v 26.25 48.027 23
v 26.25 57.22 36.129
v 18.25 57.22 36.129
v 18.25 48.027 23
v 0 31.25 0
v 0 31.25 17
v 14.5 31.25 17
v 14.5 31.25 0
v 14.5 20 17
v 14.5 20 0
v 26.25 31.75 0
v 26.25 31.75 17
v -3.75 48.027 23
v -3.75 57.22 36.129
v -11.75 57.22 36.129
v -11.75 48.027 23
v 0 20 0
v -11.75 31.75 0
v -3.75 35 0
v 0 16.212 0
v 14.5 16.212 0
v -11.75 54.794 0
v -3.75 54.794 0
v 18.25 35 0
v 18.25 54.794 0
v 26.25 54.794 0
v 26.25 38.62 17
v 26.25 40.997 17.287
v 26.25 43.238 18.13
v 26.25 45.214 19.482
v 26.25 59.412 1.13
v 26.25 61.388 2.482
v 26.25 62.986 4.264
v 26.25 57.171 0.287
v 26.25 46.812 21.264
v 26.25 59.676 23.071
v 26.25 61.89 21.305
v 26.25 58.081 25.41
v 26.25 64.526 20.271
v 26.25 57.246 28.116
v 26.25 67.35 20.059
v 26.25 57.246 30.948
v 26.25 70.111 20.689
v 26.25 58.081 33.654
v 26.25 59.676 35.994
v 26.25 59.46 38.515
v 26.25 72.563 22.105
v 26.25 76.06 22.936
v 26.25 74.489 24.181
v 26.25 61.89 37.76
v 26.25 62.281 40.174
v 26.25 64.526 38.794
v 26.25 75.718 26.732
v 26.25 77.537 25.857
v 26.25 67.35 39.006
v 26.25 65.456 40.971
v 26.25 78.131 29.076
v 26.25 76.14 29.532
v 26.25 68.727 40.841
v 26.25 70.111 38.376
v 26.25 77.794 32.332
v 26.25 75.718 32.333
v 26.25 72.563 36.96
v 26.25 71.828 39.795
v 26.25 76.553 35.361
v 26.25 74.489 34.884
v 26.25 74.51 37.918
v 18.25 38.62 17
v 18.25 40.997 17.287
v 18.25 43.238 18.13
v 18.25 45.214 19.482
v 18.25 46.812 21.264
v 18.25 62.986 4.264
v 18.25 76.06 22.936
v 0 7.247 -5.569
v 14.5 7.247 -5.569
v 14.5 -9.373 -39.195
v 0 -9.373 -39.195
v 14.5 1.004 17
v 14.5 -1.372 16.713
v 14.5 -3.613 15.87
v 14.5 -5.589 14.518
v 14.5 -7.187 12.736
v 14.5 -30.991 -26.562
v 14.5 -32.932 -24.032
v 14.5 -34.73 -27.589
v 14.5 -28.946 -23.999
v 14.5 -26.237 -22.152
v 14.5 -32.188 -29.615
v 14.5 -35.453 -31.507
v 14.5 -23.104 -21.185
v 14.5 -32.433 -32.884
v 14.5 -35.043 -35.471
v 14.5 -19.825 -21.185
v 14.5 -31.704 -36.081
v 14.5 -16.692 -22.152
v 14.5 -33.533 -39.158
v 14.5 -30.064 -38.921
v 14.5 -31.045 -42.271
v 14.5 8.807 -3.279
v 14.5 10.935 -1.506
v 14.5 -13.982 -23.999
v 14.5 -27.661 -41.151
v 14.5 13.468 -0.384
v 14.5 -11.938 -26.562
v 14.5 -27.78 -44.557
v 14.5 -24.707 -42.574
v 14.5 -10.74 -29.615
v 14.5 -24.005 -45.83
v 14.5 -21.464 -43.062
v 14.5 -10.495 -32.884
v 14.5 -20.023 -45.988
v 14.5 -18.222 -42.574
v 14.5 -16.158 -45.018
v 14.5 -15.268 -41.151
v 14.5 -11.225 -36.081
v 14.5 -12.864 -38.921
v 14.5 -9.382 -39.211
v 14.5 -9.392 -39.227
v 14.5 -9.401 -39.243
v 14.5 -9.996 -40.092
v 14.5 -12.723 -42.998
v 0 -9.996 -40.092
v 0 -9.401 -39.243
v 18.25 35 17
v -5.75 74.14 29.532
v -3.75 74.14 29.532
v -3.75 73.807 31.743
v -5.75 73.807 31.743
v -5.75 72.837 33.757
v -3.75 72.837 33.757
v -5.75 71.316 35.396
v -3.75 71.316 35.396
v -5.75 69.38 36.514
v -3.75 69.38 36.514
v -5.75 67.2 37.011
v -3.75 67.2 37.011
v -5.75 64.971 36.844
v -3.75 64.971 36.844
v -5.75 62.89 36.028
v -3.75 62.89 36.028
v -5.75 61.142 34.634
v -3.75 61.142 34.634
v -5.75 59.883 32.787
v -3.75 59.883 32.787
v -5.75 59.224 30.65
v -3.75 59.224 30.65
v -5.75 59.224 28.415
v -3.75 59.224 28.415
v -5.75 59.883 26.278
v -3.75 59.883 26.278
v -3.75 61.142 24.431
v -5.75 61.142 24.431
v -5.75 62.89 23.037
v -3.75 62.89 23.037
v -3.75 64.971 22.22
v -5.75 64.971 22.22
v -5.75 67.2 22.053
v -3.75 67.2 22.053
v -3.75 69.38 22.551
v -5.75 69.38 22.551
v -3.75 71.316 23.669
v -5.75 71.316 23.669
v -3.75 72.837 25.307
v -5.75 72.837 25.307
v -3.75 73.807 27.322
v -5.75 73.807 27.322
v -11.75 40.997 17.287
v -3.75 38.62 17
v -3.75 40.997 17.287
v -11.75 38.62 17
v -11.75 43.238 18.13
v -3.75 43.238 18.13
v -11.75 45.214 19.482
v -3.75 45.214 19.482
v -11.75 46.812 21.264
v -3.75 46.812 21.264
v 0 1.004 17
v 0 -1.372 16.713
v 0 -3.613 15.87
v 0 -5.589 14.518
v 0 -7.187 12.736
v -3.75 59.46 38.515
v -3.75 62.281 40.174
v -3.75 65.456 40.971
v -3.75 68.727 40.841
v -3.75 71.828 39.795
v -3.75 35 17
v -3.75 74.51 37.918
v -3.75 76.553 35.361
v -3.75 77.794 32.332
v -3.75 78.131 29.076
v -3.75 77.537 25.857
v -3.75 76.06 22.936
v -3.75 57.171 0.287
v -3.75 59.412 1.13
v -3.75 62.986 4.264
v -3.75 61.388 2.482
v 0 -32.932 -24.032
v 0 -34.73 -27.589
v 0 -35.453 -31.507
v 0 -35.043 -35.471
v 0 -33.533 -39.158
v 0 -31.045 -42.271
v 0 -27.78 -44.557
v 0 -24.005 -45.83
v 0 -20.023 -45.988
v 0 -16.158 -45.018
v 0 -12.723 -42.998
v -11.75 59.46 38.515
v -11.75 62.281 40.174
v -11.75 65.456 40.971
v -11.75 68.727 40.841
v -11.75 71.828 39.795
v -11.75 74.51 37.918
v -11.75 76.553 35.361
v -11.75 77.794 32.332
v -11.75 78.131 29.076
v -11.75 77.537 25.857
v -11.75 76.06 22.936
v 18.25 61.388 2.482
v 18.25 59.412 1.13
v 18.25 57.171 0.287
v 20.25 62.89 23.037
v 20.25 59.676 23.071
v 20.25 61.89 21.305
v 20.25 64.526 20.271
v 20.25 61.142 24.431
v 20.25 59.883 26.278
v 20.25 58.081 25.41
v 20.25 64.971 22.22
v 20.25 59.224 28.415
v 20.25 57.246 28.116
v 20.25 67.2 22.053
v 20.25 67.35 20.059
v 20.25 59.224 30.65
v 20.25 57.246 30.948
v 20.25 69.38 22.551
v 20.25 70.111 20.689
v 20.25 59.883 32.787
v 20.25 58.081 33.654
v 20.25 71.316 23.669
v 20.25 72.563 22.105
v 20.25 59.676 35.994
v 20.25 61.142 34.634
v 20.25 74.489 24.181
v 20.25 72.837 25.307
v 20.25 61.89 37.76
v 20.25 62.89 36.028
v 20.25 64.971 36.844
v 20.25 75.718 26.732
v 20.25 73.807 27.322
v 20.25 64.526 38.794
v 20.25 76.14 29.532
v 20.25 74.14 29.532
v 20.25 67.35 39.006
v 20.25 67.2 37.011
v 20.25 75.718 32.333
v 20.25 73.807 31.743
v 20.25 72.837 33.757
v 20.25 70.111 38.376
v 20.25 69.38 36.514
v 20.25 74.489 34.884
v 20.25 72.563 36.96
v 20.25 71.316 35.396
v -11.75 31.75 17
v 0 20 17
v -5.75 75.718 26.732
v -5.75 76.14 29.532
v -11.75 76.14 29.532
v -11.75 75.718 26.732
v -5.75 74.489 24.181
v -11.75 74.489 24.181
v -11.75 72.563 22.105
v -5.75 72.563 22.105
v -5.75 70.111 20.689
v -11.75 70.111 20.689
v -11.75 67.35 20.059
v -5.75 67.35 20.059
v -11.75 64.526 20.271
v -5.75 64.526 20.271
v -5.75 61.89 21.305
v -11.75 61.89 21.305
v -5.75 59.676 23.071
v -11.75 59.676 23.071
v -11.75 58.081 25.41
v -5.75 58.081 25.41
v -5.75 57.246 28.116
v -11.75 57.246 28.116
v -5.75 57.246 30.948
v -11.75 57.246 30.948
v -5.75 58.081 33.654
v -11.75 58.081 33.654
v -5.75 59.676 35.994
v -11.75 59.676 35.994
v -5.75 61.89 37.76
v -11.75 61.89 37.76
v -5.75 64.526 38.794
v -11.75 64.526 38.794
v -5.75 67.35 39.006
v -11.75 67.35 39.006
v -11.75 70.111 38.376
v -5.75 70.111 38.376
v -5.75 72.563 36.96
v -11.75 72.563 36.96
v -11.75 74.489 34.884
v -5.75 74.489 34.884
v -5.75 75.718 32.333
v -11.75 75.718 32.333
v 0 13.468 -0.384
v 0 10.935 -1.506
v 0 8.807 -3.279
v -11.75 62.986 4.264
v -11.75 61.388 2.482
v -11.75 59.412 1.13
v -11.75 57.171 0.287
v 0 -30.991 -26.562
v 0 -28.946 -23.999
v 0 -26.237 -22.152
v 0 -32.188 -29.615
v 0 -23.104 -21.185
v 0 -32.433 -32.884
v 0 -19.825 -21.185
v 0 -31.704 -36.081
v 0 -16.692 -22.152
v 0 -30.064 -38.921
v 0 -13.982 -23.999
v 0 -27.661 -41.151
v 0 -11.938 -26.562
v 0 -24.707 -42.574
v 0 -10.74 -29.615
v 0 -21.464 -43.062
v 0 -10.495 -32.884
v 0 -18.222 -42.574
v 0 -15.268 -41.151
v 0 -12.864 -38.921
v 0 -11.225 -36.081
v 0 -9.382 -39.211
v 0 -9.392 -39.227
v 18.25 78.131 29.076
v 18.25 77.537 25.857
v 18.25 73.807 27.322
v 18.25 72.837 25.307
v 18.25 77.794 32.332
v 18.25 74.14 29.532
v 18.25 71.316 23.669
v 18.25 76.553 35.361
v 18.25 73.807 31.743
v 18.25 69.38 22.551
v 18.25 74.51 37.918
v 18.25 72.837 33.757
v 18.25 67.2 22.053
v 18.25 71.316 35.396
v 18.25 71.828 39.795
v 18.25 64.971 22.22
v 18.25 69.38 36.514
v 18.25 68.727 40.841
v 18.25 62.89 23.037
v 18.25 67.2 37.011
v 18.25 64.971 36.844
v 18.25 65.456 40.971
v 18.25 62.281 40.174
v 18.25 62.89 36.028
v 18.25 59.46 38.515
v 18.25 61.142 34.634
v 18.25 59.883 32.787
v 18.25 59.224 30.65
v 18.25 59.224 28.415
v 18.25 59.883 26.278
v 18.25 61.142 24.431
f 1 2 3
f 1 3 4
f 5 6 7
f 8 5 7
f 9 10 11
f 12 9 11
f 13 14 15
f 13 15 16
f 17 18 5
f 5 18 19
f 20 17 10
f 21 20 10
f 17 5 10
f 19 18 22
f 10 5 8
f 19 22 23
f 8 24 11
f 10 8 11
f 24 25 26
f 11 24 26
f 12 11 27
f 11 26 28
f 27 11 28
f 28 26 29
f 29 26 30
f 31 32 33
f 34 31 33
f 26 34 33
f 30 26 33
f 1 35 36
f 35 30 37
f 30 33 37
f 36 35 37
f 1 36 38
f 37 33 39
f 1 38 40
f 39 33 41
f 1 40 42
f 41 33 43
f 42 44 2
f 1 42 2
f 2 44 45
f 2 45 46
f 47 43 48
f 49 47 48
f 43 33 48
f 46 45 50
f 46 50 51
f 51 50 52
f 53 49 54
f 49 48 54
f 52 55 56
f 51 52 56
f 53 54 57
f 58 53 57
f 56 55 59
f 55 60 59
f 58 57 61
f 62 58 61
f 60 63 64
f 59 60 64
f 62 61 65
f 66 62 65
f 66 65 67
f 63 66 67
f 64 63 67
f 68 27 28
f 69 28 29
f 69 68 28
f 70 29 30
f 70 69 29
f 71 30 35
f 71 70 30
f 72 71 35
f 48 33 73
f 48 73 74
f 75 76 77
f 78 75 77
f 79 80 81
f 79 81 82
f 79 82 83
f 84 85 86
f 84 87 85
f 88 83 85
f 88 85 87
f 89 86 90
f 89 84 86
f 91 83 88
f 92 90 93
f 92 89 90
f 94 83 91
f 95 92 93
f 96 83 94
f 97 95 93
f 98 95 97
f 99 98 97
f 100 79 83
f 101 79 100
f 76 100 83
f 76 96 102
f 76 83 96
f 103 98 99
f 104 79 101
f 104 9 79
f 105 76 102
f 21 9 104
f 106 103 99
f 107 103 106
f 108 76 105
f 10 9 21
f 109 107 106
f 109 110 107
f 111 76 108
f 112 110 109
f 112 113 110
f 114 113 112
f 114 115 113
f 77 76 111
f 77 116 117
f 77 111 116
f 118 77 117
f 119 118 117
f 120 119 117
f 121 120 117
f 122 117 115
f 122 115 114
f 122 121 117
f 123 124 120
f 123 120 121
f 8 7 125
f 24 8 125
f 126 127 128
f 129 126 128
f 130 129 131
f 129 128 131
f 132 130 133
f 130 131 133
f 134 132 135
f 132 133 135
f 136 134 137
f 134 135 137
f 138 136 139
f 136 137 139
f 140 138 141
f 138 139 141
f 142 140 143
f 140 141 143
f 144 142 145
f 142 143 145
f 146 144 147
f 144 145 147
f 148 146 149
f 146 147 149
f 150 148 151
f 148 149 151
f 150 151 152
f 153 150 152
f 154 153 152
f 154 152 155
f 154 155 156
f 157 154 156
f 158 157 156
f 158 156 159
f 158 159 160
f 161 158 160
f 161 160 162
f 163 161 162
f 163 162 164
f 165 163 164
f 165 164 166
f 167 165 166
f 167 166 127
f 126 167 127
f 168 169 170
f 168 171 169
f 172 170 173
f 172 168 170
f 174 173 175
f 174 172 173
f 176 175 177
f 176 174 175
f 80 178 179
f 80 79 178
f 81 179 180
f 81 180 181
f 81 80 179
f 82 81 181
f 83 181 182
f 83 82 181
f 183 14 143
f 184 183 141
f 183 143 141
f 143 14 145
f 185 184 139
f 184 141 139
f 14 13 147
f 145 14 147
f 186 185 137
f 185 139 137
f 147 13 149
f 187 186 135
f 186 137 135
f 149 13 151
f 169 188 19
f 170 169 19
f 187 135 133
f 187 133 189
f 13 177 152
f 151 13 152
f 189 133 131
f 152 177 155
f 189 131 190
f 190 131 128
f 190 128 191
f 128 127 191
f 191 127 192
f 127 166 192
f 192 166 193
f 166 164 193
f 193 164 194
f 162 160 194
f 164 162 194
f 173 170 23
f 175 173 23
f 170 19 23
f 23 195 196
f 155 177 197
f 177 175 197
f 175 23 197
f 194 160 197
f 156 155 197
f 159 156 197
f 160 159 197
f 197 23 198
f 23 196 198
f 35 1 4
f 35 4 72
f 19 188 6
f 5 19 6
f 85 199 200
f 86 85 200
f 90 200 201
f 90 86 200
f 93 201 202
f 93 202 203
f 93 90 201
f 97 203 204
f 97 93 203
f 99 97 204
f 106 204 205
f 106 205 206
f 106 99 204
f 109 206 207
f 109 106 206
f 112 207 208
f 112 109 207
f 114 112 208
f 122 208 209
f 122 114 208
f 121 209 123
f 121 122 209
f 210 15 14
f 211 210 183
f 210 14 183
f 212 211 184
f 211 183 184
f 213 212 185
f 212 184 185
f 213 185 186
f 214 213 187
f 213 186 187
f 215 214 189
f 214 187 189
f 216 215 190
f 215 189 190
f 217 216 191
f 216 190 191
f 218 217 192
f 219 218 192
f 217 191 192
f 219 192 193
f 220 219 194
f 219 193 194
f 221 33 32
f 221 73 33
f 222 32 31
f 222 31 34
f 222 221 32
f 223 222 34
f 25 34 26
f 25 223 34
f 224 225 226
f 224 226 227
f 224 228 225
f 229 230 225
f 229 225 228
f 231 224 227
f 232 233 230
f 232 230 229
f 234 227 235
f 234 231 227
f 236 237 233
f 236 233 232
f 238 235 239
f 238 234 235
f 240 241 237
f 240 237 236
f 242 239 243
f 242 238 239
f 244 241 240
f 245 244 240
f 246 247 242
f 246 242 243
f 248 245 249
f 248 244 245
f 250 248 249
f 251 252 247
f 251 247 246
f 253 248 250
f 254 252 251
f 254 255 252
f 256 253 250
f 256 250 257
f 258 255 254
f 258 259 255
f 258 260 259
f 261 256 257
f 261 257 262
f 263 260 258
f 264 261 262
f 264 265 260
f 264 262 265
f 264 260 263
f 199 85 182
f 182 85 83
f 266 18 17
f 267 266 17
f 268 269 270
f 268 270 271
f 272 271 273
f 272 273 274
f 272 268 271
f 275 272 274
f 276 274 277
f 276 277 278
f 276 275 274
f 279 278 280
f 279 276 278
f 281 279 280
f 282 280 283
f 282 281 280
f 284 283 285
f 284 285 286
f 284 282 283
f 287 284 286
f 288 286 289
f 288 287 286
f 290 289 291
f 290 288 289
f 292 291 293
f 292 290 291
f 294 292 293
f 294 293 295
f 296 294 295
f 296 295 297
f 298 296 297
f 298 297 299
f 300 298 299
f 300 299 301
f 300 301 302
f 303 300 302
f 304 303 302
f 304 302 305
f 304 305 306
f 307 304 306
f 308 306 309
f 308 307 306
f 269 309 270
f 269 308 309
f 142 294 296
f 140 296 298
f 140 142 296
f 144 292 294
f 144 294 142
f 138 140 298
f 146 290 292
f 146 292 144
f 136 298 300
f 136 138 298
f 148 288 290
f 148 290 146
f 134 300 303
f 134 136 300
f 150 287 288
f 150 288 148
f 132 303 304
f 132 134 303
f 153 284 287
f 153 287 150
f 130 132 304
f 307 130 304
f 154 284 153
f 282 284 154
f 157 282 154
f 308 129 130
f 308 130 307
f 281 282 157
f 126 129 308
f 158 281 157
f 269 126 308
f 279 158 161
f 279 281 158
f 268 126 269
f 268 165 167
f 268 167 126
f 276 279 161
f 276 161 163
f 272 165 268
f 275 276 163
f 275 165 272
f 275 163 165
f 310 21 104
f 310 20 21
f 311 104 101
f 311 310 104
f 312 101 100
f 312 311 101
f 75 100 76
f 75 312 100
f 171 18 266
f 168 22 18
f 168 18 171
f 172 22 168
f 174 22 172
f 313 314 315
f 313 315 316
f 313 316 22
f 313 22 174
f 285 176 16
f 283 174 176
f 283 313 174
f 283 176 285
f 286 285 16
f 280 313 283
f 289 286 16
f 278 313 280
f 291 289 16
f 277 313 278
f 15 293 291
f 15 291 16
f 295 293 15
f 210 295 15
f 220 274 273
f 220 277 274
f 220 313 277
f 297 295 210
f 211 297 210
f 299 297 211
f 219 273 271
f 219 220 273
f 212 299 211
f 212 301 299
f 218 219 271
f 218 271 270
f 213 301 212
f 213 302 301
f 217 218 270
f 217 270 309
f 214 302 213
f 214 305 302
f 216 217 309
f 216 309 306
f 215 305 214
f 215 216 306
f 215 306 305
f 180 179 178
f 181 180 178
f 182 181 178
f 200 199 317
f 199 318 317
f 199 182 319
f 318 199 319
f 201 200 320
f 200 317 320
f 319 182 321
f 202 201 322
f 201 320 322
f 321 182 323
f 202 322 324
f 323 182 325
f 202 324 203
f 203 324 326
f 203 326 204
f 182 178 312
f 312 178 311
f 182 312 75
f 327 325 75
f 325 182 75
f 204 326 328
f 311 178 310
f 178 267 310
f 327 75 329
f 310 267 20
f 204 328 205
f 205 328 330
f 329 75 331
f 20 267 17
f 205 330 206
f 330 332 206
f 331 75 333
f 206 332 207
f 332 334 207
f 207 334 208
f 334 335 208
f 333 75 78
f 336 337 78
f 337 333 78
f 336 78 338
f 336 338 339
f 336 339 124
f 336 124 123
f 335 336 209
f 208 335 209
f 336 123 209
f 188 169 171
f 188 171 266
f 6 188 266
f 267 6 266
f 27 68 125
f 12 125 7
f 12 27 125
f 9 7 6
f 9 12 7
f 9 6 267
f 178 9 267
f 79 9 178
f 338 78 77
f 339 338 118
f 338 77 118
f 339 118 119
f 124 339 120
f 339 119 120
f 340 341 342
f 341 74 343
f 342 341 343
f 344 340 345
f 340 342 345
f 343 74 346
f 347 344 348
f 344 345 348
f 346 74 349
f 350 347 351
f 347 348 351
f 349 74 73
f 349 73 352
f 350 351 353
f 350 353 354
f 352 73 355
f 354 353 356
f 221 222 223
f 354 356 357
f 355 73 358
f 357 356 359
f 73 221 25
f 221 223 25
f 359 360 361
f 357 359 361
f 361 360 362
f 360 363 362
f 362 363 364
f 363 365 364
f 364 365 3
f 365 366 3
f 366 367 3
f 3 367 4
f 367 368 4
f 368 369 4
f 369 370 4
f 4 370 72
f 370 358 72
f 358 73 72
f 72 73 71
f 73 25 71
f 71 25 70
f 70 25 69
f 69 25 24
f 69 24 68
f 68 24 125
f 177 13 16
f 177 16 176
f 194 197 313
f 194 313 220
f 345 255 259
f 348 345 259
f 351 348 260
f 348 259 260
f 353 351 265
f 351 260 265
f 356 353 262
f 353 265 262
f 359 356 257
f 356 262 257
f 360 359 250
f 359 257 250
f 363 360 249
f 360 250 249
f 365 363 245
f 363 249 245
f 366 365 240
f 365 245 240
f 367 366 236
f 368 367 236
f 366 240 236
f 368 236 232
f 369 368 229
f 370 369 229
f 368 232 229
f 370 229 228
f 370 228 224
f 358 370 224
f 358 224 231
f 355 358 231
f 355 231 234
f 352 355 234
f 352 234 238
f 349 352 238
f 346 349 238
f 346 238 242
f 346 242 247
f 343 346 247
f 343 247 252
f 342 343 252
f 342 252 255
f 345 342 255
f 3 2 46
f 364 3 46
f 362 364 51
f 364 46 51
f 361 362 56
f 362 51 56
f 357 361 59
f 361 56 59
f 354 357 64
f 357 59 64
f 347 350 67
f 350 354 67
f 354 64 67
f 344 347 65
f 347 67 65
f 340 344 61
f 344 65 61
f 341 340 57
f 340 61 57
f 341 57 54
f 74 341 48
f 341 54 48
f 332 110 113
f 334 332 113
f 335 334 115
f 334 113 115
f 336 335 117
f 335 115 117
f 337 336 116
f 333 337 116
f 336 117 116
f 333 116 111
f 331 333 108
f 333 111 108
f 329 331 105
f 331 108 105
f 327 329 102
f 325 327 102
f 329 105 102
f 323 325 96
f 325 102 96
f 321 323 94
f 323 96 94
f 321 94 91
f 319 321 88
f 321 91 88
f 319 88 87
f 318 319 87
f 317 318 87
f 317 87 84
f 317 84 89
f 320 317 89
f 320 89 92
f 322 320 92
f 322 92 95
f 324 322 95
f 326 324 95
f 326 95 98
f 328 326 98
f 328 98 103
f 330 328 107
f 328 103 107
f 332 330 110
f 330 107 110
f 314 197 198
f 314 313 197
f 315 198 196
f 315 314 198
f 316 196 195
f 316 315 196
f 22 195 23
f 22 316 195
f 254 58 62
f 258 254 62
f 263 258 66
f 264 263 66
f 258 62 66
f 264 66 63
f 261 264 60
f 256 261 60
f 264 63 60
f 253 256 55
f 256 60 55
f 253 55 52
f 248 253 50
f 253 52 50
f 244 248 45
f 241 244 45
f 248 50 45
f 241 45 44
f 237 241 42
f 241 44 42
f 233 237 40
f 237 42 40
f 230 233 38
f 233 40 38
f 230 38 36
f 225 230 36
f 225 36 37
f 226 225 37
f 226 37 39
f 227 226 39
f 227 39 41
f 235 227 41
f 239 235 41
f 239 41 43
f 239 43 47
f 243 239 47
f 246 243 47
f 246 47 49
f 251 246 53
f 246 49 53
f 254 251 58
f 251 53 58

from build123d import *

# Parameters (mm, degrees)
EXTRUDE_1_DEPTH      = 23
CUT_EXTRUDE_1_DEPTH  = 70.412264766
EXTRUDE_7_REACH      = 76.653
EXTRUDE_8_DEPTH      = 38
SKETCH_18_R          = 7.5
CUT_EXTRUDE_10_DEPTH = 97.091099475
SKETCH_16_W          = 22
SKETCH_16_H          = 105.274199252
CUT_EXTRUDE_9_DEPTH  = 60.342228518
EXTRUDE_5_DEPTH      = 14.5
EXTRUDE_6_DEPTH      = 14.5
SKETCH_14_R          = 11
CUT_EXTRUDE_8_DEPTH  = 14.5
SKETCH_19_R          = 9.5
CUT_EXTRUDE_11_DEPTH = 6
CUT_EXTRUDE_START    = -6
SKETCH_20_R          = 9.5
CUT_EXTRUDE_12_DEPTH = 6
CUT_EXTRUDE_13_DEPTH = 42
CUT_EXTRUDE_14_DEPTH = 42
FILLET_1_R           = 10


with BuildPart() as part:
    # 草图1 → 凸台-拉伸1 (new body)
    with BuildSketch(Plane.XY):
        Polygon((0, 0), (14.5, 0), (14.5, 20), (26.25, 31.75), (26.25, 60), (18.25, 60), (18.25, 35), (-3.75, 35), (-3.75, 60), (-11.75, 60), (-11.75, 31.75), (0, 20), align=None)
    extrude(amount=EXTRUDE_1_DEPTH)

    # 草图2 → 切除-拉伸1 (cut, through all)
    with BuildSketch(Plane.XY.offset(23)):
        Polygon((-3.75, 35), (0, 31.25), (14.5, 31.25), (18.25, 35), align=None)
    extrude(amount=-CUT_EXTRUDE_1_DEPTH, mode=Mode.SUBTRACT)

    # 凸台-拉伸7: up to this face of the body (flat: up to its plane)
    extrude_7_end = Plane(part.part.faces().sort_by_distance((-11.75, 45.875, 11.5))[0])
    # 草图15 → 凸台-拉伸7 (add, up to the picked face)
    with BuildSketch(Plane(origin=(26.25, 0, 0), x_dir=(0, 0, -1), z_dir=(1, 0, 0)), mode=Mode.PRIVATE) as extrude_7_sk1:
        Polygon((0, 60), (-22.93625724, 76.060140218), (-36.128515276, 57.219643199), (-23, 48.026957837), align=None)
    extrude_7_tool1 = split(extrude(extrude_7_sk1.sketch, amount=-EXTRUDE_7_REACH, mode=Mode.PRIVATE), bisect_by=extrude_7_end, keep=Keep.BOTH, mode=Mode.PRIVATE)
    add(extrude_7_tool1.solids().sort_by(Axis((26.25, 61.024992, 19.695992), (-1, 0, 0)))[0])

    # 草图17 → 凸台-拉伸8 (add)
    with BuildSketch(Plane(origin=(26.25, 0, 0), x_dir=(0, 0, -1), z_dir=(1, 0, 0))):
        with BuildLine():
            Line((-22.93625724, 76.060140218), (-36.128515276, 57.219643199))
            ThreePointArc((-36.128515276, 57.219643199), (-38.952634767, 73.236020727), (-22.93625724, 76.060140218))
        make_face()
    extrude(amount=-EXTRUDE_8_DEPTH)

    # 草图18 → 切除-拉伸10 (cut, through all)
    with BuildSketch(Plane(origin=(26.25, 0, 0), x_dir=(0, 0, -1), z_dir=(1, 0, 0))):
        with Locations(Location((-29.532386258, 66.639891709, 0), (0, 0, 90))):
            Circle(SKETCH_18_R)
    extrude(amount=-CUT_EXTRUDE_10_DEPTH, mode=Mode.SUBTRACT)

    # 草图16 → 切除-拉伸9 (cut, through all)
    with BuildSketch(Plane(origin=(0, 47.207293091, 24.574561329), x_dir=(1, 0, 0), z_dir=(0, -0.8870108331782229, -0.4617486132350318))):
        with Locations((7.25, 24.932182832)):
            Rectangle(SKETCH_16_W, SKETCH_16_H)
    extrude(amount=-CUT_EXTRUDE_9_DEPTH, mode=Mode.SUBTRACT)

    # 草图12 → 凸台-拉伸5 (add)
    with BuildSketch(Plane(origin=(14.5, 0, 0), x_dir=(0, 0, -1), z_dir=(1, 0, 0))):
        Polygon((0, 18.076915106), (40.09243026, -9.996106787), (24.032290042, -32.932364027), (-23, 0), align=None)
    extrude(amount=-EXTRUDE_5_DEPTH)

    # 草图13 → 凸台-拉伸6 (add)
    with BuildSketch(Plane(origin=(14.5, 0, 0), x_dir=(0, 0, -1), z_dir=(1, 0, 0))):
        with BuildLine():
            Line((40.09243026, -9.996106787), (24.032290042, -32.932364027))
            ThreePointArc((24.032290042, -32.932364027), (43.530488771, -29.494305516), (40.09243026, -9.996106787))
        make_face()
    extrude(amount=-EXTRUDE_6_DEPTH)

    # 草图14 → 切除-拉伸8 (cut)
    with BuildSketch(Plane(origin=(14.5, 0, 0), x_dir=(0, 0, -1), z_dir=(1, 0, 0))):
        with Locations((32.062360151, -21.464235407)):
            Circle(SKETCH_14_R)
    extrude(amount=-CUT_EXTRUDE_8_DEPTH, mode=Mode.SUBTRACT)

    # 草图19 → 切除-拉伸11 (cut)
    with BuildSketch(Plane(origin=(26.25, 0, 0), x_dir=(0, 0, -1), z_dir=(1, 0, 0))):
        with Locations(Location((-29.532386258, 66.639891709, 0), (0, 0, 90))):
            Circle(SKETCH_19_R)
    extrude(amount=-CUT_EXTRUDE_11_DEPTH, mode=Mode.SUBTRACT)

    # 草图20 → 切除-拉伸12 (cut)
    with BuildSketch(Plane.ZY.offset(11.75).offset(CUT_EXTRUDE_START)):
        with Locations(Location((29.532386258, 66.639891709, 0), (0, 0, 90))):
            Circle(SKETCH_20_R)
    extrude(amount=CUT_EXTRUDE_12_DEPTH, mode=Mode.SUBTRACT)

    # 草图21 → 切除-拉伸13 (cut)
    with BuildSketch(Plane(origin=(26.25, 0, 0), x_dir=(0, 0, -1), z_dir=(1, 0, 0))):
        Polygon((-23, 48.026957837), (-17, 43.825712608), (-17, -13.167272348), (-41.854258514, 0), align=None)
    extrude(amount=-CUT_EXTRUDE_13_DEPTH, mode=Mode.SUBTRACT)

    # 草图22 → 切除-拉伸14 (cut)
    with BuildSketch(Plane(origin=(14.5, 0, 0), x_dir=(0, 0, -1), z_dir=(1, 0, 0))):
        with BuildLine():
            Line((0, 18.076915106), (0, 10))
            Line((0, 10), (39.195351346, -9.373093948))
            ThreePointArc((39.195351346, -9.373093948), (42.389326913, -11.954817829), (44.699464232, -15.350409632))
            Line((44.699464232, -15.350409632), (51.638294373, -1.311873193))
            Line((51.638294373, -1.311873193), (0, 18.076915106))
        make_face()
    extrude(amount=-CUT_EXTRUDE_14_DEPTH, mode=Mode.SUBTRACT)

    # 圆角1
    fillet_1_edges = [part.edges().sort_by_distance(p)[0] for p in [
        (-7.75, 60, 0),
        (22.25, 60, 0),
        (7.25, -4.201245229, 17),
        (22.25, 43.825712608, 17),
        (-7.75, 43.825712608, 17),
        (7.25, 10, 0),
    ]]
    fillet(fillet_1_edges, radius=FILLET_1_R)


solid = part.part
